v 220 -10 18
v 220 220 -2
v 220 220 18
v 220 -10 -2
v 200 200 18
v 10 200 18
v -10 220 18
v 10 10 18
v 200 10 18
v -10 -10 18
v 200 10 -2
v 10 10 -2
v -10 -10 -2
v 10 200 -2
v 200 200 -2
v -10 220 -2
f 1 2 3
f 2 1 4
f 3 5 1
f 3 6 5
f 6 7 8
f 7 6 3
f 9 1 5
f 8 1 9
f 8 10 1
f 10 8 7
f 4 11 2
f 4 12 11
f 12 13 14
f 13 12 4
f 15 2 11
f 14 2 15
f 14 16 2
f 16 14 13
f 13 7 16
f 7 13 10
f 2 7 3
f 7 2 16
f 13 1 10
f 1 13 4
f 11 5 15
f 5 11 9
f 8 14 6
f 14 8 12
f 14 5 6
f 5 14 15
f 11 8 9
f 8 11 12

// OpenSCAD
// Generated by SolidPython 1.1.3 on 2022-07-09 18:13:25


difference() {
	translate(v = [-10.0000000000, -10.0000000000, -2]) {
		cube(size = [230, 230, 20]);
	}
	translate(v = [10.0000000000, 10.0000000000, -4]) {
		cube(size = [190, 190, 26]);
	}
}
/***********************************************
*********      SolidPython code:      **********
************************************************
 
#!/usr/bin/env python3
# -*- coding: utf-8 -*-
"""
Created on Tue Feb 22 16:31:46 2022

@author: pchaillo

"""
import os
import solid as sp
import math as math


stl_name = "figure_split_auto"
scad_name = "figure_split_auto"
scad_name_trans = scad_name + "trans"

taille_fig_x = 400 # taille de la figure à imprimer
taille_fig_y = 450

taille_plat_x = 210 # en mm
taille_plat_y = 210

trans_e = 20 # taille de la transition

off_x = 30 # offset pour le placement du premier plateau 
off_y = 40

path = os.path.dirname(os.path.abspath(__file__))
path_stl_raw = path + '/STL/' + stl_name
path_scad_raw = path + '/SCAD_CODE/' + scad_name

contour = sp.linear_extrude(14)(sp.import_stl("mera_v02_14_best.svg"))
coeur_down = sp.translate([0,0,-1])(sp.linear_extrude(4)(sp.import_stl("mera_v02_10_best.svg")))
coeur_up = sp.translate([0,0,6])(sp.linear_extrude(9)(sp.import_stl("mera_v02_10_best.svg")))
coeur = sp.union()(coeur_up,coeur_down)

piece = sp.difference()(contour,coeur)

plateau = sp.cube([taille_plat_x,taille_plat_y,20])

bordure_ext = sp.translate([-trans_e/2,-trans_e/2,-2])(sp.cube([taille_plat_x+trans_e,taille_plat_y+trans_e,20]))
bordure_int = sp.translate([trans_e/2,trans_e/2,-4])(sp.cube([taille_plat_x-trans_e,taille_plat_y-trans_e,20+6]))
bordure = sp.difference()(bordure_ext,bordure_int)

ind = 0
path_scad = path_scad_raw + "_000" + str(ind) + ".scad"
sp.scad_render_to_file(bordure, path_scad)

# nb_p_x = math.ceil((taille_fig_x-off_x)/taille_plat_x) # nombre de décalages en x nécessaires
# nb_p_y = math.ceil((taille_fig_y-off_y)/taille_plat_y) # nombre de décalages en x nécessaires

# ind = 0
# for x in range(nb_p_x) : 
# 	for y in range(nb_p_y):
# 		ind += 1
# 		carre = sp.translate([off_x+taille_plat_x*x ,off_y+taille_plat_y*y,0])(plateau)
# 		to_print = sp.intersection()(piece,carre)
# 		path_scad = path_scad_raw + "_0" + str(ind) + ".scad"
# 		sp.scad_render_to_file(to_print, path_scad)


# carre = sp.translate([off_x,off_y,0])(plateau);
# to_print = sp.intersection()(piece,carre)
# sp.scad_render_to_file(to_print, path_scad)

# command = 'openscad -o ' + path_stl + ' ' + path_scad
# os.system(command) 
 
 
************************************************/
